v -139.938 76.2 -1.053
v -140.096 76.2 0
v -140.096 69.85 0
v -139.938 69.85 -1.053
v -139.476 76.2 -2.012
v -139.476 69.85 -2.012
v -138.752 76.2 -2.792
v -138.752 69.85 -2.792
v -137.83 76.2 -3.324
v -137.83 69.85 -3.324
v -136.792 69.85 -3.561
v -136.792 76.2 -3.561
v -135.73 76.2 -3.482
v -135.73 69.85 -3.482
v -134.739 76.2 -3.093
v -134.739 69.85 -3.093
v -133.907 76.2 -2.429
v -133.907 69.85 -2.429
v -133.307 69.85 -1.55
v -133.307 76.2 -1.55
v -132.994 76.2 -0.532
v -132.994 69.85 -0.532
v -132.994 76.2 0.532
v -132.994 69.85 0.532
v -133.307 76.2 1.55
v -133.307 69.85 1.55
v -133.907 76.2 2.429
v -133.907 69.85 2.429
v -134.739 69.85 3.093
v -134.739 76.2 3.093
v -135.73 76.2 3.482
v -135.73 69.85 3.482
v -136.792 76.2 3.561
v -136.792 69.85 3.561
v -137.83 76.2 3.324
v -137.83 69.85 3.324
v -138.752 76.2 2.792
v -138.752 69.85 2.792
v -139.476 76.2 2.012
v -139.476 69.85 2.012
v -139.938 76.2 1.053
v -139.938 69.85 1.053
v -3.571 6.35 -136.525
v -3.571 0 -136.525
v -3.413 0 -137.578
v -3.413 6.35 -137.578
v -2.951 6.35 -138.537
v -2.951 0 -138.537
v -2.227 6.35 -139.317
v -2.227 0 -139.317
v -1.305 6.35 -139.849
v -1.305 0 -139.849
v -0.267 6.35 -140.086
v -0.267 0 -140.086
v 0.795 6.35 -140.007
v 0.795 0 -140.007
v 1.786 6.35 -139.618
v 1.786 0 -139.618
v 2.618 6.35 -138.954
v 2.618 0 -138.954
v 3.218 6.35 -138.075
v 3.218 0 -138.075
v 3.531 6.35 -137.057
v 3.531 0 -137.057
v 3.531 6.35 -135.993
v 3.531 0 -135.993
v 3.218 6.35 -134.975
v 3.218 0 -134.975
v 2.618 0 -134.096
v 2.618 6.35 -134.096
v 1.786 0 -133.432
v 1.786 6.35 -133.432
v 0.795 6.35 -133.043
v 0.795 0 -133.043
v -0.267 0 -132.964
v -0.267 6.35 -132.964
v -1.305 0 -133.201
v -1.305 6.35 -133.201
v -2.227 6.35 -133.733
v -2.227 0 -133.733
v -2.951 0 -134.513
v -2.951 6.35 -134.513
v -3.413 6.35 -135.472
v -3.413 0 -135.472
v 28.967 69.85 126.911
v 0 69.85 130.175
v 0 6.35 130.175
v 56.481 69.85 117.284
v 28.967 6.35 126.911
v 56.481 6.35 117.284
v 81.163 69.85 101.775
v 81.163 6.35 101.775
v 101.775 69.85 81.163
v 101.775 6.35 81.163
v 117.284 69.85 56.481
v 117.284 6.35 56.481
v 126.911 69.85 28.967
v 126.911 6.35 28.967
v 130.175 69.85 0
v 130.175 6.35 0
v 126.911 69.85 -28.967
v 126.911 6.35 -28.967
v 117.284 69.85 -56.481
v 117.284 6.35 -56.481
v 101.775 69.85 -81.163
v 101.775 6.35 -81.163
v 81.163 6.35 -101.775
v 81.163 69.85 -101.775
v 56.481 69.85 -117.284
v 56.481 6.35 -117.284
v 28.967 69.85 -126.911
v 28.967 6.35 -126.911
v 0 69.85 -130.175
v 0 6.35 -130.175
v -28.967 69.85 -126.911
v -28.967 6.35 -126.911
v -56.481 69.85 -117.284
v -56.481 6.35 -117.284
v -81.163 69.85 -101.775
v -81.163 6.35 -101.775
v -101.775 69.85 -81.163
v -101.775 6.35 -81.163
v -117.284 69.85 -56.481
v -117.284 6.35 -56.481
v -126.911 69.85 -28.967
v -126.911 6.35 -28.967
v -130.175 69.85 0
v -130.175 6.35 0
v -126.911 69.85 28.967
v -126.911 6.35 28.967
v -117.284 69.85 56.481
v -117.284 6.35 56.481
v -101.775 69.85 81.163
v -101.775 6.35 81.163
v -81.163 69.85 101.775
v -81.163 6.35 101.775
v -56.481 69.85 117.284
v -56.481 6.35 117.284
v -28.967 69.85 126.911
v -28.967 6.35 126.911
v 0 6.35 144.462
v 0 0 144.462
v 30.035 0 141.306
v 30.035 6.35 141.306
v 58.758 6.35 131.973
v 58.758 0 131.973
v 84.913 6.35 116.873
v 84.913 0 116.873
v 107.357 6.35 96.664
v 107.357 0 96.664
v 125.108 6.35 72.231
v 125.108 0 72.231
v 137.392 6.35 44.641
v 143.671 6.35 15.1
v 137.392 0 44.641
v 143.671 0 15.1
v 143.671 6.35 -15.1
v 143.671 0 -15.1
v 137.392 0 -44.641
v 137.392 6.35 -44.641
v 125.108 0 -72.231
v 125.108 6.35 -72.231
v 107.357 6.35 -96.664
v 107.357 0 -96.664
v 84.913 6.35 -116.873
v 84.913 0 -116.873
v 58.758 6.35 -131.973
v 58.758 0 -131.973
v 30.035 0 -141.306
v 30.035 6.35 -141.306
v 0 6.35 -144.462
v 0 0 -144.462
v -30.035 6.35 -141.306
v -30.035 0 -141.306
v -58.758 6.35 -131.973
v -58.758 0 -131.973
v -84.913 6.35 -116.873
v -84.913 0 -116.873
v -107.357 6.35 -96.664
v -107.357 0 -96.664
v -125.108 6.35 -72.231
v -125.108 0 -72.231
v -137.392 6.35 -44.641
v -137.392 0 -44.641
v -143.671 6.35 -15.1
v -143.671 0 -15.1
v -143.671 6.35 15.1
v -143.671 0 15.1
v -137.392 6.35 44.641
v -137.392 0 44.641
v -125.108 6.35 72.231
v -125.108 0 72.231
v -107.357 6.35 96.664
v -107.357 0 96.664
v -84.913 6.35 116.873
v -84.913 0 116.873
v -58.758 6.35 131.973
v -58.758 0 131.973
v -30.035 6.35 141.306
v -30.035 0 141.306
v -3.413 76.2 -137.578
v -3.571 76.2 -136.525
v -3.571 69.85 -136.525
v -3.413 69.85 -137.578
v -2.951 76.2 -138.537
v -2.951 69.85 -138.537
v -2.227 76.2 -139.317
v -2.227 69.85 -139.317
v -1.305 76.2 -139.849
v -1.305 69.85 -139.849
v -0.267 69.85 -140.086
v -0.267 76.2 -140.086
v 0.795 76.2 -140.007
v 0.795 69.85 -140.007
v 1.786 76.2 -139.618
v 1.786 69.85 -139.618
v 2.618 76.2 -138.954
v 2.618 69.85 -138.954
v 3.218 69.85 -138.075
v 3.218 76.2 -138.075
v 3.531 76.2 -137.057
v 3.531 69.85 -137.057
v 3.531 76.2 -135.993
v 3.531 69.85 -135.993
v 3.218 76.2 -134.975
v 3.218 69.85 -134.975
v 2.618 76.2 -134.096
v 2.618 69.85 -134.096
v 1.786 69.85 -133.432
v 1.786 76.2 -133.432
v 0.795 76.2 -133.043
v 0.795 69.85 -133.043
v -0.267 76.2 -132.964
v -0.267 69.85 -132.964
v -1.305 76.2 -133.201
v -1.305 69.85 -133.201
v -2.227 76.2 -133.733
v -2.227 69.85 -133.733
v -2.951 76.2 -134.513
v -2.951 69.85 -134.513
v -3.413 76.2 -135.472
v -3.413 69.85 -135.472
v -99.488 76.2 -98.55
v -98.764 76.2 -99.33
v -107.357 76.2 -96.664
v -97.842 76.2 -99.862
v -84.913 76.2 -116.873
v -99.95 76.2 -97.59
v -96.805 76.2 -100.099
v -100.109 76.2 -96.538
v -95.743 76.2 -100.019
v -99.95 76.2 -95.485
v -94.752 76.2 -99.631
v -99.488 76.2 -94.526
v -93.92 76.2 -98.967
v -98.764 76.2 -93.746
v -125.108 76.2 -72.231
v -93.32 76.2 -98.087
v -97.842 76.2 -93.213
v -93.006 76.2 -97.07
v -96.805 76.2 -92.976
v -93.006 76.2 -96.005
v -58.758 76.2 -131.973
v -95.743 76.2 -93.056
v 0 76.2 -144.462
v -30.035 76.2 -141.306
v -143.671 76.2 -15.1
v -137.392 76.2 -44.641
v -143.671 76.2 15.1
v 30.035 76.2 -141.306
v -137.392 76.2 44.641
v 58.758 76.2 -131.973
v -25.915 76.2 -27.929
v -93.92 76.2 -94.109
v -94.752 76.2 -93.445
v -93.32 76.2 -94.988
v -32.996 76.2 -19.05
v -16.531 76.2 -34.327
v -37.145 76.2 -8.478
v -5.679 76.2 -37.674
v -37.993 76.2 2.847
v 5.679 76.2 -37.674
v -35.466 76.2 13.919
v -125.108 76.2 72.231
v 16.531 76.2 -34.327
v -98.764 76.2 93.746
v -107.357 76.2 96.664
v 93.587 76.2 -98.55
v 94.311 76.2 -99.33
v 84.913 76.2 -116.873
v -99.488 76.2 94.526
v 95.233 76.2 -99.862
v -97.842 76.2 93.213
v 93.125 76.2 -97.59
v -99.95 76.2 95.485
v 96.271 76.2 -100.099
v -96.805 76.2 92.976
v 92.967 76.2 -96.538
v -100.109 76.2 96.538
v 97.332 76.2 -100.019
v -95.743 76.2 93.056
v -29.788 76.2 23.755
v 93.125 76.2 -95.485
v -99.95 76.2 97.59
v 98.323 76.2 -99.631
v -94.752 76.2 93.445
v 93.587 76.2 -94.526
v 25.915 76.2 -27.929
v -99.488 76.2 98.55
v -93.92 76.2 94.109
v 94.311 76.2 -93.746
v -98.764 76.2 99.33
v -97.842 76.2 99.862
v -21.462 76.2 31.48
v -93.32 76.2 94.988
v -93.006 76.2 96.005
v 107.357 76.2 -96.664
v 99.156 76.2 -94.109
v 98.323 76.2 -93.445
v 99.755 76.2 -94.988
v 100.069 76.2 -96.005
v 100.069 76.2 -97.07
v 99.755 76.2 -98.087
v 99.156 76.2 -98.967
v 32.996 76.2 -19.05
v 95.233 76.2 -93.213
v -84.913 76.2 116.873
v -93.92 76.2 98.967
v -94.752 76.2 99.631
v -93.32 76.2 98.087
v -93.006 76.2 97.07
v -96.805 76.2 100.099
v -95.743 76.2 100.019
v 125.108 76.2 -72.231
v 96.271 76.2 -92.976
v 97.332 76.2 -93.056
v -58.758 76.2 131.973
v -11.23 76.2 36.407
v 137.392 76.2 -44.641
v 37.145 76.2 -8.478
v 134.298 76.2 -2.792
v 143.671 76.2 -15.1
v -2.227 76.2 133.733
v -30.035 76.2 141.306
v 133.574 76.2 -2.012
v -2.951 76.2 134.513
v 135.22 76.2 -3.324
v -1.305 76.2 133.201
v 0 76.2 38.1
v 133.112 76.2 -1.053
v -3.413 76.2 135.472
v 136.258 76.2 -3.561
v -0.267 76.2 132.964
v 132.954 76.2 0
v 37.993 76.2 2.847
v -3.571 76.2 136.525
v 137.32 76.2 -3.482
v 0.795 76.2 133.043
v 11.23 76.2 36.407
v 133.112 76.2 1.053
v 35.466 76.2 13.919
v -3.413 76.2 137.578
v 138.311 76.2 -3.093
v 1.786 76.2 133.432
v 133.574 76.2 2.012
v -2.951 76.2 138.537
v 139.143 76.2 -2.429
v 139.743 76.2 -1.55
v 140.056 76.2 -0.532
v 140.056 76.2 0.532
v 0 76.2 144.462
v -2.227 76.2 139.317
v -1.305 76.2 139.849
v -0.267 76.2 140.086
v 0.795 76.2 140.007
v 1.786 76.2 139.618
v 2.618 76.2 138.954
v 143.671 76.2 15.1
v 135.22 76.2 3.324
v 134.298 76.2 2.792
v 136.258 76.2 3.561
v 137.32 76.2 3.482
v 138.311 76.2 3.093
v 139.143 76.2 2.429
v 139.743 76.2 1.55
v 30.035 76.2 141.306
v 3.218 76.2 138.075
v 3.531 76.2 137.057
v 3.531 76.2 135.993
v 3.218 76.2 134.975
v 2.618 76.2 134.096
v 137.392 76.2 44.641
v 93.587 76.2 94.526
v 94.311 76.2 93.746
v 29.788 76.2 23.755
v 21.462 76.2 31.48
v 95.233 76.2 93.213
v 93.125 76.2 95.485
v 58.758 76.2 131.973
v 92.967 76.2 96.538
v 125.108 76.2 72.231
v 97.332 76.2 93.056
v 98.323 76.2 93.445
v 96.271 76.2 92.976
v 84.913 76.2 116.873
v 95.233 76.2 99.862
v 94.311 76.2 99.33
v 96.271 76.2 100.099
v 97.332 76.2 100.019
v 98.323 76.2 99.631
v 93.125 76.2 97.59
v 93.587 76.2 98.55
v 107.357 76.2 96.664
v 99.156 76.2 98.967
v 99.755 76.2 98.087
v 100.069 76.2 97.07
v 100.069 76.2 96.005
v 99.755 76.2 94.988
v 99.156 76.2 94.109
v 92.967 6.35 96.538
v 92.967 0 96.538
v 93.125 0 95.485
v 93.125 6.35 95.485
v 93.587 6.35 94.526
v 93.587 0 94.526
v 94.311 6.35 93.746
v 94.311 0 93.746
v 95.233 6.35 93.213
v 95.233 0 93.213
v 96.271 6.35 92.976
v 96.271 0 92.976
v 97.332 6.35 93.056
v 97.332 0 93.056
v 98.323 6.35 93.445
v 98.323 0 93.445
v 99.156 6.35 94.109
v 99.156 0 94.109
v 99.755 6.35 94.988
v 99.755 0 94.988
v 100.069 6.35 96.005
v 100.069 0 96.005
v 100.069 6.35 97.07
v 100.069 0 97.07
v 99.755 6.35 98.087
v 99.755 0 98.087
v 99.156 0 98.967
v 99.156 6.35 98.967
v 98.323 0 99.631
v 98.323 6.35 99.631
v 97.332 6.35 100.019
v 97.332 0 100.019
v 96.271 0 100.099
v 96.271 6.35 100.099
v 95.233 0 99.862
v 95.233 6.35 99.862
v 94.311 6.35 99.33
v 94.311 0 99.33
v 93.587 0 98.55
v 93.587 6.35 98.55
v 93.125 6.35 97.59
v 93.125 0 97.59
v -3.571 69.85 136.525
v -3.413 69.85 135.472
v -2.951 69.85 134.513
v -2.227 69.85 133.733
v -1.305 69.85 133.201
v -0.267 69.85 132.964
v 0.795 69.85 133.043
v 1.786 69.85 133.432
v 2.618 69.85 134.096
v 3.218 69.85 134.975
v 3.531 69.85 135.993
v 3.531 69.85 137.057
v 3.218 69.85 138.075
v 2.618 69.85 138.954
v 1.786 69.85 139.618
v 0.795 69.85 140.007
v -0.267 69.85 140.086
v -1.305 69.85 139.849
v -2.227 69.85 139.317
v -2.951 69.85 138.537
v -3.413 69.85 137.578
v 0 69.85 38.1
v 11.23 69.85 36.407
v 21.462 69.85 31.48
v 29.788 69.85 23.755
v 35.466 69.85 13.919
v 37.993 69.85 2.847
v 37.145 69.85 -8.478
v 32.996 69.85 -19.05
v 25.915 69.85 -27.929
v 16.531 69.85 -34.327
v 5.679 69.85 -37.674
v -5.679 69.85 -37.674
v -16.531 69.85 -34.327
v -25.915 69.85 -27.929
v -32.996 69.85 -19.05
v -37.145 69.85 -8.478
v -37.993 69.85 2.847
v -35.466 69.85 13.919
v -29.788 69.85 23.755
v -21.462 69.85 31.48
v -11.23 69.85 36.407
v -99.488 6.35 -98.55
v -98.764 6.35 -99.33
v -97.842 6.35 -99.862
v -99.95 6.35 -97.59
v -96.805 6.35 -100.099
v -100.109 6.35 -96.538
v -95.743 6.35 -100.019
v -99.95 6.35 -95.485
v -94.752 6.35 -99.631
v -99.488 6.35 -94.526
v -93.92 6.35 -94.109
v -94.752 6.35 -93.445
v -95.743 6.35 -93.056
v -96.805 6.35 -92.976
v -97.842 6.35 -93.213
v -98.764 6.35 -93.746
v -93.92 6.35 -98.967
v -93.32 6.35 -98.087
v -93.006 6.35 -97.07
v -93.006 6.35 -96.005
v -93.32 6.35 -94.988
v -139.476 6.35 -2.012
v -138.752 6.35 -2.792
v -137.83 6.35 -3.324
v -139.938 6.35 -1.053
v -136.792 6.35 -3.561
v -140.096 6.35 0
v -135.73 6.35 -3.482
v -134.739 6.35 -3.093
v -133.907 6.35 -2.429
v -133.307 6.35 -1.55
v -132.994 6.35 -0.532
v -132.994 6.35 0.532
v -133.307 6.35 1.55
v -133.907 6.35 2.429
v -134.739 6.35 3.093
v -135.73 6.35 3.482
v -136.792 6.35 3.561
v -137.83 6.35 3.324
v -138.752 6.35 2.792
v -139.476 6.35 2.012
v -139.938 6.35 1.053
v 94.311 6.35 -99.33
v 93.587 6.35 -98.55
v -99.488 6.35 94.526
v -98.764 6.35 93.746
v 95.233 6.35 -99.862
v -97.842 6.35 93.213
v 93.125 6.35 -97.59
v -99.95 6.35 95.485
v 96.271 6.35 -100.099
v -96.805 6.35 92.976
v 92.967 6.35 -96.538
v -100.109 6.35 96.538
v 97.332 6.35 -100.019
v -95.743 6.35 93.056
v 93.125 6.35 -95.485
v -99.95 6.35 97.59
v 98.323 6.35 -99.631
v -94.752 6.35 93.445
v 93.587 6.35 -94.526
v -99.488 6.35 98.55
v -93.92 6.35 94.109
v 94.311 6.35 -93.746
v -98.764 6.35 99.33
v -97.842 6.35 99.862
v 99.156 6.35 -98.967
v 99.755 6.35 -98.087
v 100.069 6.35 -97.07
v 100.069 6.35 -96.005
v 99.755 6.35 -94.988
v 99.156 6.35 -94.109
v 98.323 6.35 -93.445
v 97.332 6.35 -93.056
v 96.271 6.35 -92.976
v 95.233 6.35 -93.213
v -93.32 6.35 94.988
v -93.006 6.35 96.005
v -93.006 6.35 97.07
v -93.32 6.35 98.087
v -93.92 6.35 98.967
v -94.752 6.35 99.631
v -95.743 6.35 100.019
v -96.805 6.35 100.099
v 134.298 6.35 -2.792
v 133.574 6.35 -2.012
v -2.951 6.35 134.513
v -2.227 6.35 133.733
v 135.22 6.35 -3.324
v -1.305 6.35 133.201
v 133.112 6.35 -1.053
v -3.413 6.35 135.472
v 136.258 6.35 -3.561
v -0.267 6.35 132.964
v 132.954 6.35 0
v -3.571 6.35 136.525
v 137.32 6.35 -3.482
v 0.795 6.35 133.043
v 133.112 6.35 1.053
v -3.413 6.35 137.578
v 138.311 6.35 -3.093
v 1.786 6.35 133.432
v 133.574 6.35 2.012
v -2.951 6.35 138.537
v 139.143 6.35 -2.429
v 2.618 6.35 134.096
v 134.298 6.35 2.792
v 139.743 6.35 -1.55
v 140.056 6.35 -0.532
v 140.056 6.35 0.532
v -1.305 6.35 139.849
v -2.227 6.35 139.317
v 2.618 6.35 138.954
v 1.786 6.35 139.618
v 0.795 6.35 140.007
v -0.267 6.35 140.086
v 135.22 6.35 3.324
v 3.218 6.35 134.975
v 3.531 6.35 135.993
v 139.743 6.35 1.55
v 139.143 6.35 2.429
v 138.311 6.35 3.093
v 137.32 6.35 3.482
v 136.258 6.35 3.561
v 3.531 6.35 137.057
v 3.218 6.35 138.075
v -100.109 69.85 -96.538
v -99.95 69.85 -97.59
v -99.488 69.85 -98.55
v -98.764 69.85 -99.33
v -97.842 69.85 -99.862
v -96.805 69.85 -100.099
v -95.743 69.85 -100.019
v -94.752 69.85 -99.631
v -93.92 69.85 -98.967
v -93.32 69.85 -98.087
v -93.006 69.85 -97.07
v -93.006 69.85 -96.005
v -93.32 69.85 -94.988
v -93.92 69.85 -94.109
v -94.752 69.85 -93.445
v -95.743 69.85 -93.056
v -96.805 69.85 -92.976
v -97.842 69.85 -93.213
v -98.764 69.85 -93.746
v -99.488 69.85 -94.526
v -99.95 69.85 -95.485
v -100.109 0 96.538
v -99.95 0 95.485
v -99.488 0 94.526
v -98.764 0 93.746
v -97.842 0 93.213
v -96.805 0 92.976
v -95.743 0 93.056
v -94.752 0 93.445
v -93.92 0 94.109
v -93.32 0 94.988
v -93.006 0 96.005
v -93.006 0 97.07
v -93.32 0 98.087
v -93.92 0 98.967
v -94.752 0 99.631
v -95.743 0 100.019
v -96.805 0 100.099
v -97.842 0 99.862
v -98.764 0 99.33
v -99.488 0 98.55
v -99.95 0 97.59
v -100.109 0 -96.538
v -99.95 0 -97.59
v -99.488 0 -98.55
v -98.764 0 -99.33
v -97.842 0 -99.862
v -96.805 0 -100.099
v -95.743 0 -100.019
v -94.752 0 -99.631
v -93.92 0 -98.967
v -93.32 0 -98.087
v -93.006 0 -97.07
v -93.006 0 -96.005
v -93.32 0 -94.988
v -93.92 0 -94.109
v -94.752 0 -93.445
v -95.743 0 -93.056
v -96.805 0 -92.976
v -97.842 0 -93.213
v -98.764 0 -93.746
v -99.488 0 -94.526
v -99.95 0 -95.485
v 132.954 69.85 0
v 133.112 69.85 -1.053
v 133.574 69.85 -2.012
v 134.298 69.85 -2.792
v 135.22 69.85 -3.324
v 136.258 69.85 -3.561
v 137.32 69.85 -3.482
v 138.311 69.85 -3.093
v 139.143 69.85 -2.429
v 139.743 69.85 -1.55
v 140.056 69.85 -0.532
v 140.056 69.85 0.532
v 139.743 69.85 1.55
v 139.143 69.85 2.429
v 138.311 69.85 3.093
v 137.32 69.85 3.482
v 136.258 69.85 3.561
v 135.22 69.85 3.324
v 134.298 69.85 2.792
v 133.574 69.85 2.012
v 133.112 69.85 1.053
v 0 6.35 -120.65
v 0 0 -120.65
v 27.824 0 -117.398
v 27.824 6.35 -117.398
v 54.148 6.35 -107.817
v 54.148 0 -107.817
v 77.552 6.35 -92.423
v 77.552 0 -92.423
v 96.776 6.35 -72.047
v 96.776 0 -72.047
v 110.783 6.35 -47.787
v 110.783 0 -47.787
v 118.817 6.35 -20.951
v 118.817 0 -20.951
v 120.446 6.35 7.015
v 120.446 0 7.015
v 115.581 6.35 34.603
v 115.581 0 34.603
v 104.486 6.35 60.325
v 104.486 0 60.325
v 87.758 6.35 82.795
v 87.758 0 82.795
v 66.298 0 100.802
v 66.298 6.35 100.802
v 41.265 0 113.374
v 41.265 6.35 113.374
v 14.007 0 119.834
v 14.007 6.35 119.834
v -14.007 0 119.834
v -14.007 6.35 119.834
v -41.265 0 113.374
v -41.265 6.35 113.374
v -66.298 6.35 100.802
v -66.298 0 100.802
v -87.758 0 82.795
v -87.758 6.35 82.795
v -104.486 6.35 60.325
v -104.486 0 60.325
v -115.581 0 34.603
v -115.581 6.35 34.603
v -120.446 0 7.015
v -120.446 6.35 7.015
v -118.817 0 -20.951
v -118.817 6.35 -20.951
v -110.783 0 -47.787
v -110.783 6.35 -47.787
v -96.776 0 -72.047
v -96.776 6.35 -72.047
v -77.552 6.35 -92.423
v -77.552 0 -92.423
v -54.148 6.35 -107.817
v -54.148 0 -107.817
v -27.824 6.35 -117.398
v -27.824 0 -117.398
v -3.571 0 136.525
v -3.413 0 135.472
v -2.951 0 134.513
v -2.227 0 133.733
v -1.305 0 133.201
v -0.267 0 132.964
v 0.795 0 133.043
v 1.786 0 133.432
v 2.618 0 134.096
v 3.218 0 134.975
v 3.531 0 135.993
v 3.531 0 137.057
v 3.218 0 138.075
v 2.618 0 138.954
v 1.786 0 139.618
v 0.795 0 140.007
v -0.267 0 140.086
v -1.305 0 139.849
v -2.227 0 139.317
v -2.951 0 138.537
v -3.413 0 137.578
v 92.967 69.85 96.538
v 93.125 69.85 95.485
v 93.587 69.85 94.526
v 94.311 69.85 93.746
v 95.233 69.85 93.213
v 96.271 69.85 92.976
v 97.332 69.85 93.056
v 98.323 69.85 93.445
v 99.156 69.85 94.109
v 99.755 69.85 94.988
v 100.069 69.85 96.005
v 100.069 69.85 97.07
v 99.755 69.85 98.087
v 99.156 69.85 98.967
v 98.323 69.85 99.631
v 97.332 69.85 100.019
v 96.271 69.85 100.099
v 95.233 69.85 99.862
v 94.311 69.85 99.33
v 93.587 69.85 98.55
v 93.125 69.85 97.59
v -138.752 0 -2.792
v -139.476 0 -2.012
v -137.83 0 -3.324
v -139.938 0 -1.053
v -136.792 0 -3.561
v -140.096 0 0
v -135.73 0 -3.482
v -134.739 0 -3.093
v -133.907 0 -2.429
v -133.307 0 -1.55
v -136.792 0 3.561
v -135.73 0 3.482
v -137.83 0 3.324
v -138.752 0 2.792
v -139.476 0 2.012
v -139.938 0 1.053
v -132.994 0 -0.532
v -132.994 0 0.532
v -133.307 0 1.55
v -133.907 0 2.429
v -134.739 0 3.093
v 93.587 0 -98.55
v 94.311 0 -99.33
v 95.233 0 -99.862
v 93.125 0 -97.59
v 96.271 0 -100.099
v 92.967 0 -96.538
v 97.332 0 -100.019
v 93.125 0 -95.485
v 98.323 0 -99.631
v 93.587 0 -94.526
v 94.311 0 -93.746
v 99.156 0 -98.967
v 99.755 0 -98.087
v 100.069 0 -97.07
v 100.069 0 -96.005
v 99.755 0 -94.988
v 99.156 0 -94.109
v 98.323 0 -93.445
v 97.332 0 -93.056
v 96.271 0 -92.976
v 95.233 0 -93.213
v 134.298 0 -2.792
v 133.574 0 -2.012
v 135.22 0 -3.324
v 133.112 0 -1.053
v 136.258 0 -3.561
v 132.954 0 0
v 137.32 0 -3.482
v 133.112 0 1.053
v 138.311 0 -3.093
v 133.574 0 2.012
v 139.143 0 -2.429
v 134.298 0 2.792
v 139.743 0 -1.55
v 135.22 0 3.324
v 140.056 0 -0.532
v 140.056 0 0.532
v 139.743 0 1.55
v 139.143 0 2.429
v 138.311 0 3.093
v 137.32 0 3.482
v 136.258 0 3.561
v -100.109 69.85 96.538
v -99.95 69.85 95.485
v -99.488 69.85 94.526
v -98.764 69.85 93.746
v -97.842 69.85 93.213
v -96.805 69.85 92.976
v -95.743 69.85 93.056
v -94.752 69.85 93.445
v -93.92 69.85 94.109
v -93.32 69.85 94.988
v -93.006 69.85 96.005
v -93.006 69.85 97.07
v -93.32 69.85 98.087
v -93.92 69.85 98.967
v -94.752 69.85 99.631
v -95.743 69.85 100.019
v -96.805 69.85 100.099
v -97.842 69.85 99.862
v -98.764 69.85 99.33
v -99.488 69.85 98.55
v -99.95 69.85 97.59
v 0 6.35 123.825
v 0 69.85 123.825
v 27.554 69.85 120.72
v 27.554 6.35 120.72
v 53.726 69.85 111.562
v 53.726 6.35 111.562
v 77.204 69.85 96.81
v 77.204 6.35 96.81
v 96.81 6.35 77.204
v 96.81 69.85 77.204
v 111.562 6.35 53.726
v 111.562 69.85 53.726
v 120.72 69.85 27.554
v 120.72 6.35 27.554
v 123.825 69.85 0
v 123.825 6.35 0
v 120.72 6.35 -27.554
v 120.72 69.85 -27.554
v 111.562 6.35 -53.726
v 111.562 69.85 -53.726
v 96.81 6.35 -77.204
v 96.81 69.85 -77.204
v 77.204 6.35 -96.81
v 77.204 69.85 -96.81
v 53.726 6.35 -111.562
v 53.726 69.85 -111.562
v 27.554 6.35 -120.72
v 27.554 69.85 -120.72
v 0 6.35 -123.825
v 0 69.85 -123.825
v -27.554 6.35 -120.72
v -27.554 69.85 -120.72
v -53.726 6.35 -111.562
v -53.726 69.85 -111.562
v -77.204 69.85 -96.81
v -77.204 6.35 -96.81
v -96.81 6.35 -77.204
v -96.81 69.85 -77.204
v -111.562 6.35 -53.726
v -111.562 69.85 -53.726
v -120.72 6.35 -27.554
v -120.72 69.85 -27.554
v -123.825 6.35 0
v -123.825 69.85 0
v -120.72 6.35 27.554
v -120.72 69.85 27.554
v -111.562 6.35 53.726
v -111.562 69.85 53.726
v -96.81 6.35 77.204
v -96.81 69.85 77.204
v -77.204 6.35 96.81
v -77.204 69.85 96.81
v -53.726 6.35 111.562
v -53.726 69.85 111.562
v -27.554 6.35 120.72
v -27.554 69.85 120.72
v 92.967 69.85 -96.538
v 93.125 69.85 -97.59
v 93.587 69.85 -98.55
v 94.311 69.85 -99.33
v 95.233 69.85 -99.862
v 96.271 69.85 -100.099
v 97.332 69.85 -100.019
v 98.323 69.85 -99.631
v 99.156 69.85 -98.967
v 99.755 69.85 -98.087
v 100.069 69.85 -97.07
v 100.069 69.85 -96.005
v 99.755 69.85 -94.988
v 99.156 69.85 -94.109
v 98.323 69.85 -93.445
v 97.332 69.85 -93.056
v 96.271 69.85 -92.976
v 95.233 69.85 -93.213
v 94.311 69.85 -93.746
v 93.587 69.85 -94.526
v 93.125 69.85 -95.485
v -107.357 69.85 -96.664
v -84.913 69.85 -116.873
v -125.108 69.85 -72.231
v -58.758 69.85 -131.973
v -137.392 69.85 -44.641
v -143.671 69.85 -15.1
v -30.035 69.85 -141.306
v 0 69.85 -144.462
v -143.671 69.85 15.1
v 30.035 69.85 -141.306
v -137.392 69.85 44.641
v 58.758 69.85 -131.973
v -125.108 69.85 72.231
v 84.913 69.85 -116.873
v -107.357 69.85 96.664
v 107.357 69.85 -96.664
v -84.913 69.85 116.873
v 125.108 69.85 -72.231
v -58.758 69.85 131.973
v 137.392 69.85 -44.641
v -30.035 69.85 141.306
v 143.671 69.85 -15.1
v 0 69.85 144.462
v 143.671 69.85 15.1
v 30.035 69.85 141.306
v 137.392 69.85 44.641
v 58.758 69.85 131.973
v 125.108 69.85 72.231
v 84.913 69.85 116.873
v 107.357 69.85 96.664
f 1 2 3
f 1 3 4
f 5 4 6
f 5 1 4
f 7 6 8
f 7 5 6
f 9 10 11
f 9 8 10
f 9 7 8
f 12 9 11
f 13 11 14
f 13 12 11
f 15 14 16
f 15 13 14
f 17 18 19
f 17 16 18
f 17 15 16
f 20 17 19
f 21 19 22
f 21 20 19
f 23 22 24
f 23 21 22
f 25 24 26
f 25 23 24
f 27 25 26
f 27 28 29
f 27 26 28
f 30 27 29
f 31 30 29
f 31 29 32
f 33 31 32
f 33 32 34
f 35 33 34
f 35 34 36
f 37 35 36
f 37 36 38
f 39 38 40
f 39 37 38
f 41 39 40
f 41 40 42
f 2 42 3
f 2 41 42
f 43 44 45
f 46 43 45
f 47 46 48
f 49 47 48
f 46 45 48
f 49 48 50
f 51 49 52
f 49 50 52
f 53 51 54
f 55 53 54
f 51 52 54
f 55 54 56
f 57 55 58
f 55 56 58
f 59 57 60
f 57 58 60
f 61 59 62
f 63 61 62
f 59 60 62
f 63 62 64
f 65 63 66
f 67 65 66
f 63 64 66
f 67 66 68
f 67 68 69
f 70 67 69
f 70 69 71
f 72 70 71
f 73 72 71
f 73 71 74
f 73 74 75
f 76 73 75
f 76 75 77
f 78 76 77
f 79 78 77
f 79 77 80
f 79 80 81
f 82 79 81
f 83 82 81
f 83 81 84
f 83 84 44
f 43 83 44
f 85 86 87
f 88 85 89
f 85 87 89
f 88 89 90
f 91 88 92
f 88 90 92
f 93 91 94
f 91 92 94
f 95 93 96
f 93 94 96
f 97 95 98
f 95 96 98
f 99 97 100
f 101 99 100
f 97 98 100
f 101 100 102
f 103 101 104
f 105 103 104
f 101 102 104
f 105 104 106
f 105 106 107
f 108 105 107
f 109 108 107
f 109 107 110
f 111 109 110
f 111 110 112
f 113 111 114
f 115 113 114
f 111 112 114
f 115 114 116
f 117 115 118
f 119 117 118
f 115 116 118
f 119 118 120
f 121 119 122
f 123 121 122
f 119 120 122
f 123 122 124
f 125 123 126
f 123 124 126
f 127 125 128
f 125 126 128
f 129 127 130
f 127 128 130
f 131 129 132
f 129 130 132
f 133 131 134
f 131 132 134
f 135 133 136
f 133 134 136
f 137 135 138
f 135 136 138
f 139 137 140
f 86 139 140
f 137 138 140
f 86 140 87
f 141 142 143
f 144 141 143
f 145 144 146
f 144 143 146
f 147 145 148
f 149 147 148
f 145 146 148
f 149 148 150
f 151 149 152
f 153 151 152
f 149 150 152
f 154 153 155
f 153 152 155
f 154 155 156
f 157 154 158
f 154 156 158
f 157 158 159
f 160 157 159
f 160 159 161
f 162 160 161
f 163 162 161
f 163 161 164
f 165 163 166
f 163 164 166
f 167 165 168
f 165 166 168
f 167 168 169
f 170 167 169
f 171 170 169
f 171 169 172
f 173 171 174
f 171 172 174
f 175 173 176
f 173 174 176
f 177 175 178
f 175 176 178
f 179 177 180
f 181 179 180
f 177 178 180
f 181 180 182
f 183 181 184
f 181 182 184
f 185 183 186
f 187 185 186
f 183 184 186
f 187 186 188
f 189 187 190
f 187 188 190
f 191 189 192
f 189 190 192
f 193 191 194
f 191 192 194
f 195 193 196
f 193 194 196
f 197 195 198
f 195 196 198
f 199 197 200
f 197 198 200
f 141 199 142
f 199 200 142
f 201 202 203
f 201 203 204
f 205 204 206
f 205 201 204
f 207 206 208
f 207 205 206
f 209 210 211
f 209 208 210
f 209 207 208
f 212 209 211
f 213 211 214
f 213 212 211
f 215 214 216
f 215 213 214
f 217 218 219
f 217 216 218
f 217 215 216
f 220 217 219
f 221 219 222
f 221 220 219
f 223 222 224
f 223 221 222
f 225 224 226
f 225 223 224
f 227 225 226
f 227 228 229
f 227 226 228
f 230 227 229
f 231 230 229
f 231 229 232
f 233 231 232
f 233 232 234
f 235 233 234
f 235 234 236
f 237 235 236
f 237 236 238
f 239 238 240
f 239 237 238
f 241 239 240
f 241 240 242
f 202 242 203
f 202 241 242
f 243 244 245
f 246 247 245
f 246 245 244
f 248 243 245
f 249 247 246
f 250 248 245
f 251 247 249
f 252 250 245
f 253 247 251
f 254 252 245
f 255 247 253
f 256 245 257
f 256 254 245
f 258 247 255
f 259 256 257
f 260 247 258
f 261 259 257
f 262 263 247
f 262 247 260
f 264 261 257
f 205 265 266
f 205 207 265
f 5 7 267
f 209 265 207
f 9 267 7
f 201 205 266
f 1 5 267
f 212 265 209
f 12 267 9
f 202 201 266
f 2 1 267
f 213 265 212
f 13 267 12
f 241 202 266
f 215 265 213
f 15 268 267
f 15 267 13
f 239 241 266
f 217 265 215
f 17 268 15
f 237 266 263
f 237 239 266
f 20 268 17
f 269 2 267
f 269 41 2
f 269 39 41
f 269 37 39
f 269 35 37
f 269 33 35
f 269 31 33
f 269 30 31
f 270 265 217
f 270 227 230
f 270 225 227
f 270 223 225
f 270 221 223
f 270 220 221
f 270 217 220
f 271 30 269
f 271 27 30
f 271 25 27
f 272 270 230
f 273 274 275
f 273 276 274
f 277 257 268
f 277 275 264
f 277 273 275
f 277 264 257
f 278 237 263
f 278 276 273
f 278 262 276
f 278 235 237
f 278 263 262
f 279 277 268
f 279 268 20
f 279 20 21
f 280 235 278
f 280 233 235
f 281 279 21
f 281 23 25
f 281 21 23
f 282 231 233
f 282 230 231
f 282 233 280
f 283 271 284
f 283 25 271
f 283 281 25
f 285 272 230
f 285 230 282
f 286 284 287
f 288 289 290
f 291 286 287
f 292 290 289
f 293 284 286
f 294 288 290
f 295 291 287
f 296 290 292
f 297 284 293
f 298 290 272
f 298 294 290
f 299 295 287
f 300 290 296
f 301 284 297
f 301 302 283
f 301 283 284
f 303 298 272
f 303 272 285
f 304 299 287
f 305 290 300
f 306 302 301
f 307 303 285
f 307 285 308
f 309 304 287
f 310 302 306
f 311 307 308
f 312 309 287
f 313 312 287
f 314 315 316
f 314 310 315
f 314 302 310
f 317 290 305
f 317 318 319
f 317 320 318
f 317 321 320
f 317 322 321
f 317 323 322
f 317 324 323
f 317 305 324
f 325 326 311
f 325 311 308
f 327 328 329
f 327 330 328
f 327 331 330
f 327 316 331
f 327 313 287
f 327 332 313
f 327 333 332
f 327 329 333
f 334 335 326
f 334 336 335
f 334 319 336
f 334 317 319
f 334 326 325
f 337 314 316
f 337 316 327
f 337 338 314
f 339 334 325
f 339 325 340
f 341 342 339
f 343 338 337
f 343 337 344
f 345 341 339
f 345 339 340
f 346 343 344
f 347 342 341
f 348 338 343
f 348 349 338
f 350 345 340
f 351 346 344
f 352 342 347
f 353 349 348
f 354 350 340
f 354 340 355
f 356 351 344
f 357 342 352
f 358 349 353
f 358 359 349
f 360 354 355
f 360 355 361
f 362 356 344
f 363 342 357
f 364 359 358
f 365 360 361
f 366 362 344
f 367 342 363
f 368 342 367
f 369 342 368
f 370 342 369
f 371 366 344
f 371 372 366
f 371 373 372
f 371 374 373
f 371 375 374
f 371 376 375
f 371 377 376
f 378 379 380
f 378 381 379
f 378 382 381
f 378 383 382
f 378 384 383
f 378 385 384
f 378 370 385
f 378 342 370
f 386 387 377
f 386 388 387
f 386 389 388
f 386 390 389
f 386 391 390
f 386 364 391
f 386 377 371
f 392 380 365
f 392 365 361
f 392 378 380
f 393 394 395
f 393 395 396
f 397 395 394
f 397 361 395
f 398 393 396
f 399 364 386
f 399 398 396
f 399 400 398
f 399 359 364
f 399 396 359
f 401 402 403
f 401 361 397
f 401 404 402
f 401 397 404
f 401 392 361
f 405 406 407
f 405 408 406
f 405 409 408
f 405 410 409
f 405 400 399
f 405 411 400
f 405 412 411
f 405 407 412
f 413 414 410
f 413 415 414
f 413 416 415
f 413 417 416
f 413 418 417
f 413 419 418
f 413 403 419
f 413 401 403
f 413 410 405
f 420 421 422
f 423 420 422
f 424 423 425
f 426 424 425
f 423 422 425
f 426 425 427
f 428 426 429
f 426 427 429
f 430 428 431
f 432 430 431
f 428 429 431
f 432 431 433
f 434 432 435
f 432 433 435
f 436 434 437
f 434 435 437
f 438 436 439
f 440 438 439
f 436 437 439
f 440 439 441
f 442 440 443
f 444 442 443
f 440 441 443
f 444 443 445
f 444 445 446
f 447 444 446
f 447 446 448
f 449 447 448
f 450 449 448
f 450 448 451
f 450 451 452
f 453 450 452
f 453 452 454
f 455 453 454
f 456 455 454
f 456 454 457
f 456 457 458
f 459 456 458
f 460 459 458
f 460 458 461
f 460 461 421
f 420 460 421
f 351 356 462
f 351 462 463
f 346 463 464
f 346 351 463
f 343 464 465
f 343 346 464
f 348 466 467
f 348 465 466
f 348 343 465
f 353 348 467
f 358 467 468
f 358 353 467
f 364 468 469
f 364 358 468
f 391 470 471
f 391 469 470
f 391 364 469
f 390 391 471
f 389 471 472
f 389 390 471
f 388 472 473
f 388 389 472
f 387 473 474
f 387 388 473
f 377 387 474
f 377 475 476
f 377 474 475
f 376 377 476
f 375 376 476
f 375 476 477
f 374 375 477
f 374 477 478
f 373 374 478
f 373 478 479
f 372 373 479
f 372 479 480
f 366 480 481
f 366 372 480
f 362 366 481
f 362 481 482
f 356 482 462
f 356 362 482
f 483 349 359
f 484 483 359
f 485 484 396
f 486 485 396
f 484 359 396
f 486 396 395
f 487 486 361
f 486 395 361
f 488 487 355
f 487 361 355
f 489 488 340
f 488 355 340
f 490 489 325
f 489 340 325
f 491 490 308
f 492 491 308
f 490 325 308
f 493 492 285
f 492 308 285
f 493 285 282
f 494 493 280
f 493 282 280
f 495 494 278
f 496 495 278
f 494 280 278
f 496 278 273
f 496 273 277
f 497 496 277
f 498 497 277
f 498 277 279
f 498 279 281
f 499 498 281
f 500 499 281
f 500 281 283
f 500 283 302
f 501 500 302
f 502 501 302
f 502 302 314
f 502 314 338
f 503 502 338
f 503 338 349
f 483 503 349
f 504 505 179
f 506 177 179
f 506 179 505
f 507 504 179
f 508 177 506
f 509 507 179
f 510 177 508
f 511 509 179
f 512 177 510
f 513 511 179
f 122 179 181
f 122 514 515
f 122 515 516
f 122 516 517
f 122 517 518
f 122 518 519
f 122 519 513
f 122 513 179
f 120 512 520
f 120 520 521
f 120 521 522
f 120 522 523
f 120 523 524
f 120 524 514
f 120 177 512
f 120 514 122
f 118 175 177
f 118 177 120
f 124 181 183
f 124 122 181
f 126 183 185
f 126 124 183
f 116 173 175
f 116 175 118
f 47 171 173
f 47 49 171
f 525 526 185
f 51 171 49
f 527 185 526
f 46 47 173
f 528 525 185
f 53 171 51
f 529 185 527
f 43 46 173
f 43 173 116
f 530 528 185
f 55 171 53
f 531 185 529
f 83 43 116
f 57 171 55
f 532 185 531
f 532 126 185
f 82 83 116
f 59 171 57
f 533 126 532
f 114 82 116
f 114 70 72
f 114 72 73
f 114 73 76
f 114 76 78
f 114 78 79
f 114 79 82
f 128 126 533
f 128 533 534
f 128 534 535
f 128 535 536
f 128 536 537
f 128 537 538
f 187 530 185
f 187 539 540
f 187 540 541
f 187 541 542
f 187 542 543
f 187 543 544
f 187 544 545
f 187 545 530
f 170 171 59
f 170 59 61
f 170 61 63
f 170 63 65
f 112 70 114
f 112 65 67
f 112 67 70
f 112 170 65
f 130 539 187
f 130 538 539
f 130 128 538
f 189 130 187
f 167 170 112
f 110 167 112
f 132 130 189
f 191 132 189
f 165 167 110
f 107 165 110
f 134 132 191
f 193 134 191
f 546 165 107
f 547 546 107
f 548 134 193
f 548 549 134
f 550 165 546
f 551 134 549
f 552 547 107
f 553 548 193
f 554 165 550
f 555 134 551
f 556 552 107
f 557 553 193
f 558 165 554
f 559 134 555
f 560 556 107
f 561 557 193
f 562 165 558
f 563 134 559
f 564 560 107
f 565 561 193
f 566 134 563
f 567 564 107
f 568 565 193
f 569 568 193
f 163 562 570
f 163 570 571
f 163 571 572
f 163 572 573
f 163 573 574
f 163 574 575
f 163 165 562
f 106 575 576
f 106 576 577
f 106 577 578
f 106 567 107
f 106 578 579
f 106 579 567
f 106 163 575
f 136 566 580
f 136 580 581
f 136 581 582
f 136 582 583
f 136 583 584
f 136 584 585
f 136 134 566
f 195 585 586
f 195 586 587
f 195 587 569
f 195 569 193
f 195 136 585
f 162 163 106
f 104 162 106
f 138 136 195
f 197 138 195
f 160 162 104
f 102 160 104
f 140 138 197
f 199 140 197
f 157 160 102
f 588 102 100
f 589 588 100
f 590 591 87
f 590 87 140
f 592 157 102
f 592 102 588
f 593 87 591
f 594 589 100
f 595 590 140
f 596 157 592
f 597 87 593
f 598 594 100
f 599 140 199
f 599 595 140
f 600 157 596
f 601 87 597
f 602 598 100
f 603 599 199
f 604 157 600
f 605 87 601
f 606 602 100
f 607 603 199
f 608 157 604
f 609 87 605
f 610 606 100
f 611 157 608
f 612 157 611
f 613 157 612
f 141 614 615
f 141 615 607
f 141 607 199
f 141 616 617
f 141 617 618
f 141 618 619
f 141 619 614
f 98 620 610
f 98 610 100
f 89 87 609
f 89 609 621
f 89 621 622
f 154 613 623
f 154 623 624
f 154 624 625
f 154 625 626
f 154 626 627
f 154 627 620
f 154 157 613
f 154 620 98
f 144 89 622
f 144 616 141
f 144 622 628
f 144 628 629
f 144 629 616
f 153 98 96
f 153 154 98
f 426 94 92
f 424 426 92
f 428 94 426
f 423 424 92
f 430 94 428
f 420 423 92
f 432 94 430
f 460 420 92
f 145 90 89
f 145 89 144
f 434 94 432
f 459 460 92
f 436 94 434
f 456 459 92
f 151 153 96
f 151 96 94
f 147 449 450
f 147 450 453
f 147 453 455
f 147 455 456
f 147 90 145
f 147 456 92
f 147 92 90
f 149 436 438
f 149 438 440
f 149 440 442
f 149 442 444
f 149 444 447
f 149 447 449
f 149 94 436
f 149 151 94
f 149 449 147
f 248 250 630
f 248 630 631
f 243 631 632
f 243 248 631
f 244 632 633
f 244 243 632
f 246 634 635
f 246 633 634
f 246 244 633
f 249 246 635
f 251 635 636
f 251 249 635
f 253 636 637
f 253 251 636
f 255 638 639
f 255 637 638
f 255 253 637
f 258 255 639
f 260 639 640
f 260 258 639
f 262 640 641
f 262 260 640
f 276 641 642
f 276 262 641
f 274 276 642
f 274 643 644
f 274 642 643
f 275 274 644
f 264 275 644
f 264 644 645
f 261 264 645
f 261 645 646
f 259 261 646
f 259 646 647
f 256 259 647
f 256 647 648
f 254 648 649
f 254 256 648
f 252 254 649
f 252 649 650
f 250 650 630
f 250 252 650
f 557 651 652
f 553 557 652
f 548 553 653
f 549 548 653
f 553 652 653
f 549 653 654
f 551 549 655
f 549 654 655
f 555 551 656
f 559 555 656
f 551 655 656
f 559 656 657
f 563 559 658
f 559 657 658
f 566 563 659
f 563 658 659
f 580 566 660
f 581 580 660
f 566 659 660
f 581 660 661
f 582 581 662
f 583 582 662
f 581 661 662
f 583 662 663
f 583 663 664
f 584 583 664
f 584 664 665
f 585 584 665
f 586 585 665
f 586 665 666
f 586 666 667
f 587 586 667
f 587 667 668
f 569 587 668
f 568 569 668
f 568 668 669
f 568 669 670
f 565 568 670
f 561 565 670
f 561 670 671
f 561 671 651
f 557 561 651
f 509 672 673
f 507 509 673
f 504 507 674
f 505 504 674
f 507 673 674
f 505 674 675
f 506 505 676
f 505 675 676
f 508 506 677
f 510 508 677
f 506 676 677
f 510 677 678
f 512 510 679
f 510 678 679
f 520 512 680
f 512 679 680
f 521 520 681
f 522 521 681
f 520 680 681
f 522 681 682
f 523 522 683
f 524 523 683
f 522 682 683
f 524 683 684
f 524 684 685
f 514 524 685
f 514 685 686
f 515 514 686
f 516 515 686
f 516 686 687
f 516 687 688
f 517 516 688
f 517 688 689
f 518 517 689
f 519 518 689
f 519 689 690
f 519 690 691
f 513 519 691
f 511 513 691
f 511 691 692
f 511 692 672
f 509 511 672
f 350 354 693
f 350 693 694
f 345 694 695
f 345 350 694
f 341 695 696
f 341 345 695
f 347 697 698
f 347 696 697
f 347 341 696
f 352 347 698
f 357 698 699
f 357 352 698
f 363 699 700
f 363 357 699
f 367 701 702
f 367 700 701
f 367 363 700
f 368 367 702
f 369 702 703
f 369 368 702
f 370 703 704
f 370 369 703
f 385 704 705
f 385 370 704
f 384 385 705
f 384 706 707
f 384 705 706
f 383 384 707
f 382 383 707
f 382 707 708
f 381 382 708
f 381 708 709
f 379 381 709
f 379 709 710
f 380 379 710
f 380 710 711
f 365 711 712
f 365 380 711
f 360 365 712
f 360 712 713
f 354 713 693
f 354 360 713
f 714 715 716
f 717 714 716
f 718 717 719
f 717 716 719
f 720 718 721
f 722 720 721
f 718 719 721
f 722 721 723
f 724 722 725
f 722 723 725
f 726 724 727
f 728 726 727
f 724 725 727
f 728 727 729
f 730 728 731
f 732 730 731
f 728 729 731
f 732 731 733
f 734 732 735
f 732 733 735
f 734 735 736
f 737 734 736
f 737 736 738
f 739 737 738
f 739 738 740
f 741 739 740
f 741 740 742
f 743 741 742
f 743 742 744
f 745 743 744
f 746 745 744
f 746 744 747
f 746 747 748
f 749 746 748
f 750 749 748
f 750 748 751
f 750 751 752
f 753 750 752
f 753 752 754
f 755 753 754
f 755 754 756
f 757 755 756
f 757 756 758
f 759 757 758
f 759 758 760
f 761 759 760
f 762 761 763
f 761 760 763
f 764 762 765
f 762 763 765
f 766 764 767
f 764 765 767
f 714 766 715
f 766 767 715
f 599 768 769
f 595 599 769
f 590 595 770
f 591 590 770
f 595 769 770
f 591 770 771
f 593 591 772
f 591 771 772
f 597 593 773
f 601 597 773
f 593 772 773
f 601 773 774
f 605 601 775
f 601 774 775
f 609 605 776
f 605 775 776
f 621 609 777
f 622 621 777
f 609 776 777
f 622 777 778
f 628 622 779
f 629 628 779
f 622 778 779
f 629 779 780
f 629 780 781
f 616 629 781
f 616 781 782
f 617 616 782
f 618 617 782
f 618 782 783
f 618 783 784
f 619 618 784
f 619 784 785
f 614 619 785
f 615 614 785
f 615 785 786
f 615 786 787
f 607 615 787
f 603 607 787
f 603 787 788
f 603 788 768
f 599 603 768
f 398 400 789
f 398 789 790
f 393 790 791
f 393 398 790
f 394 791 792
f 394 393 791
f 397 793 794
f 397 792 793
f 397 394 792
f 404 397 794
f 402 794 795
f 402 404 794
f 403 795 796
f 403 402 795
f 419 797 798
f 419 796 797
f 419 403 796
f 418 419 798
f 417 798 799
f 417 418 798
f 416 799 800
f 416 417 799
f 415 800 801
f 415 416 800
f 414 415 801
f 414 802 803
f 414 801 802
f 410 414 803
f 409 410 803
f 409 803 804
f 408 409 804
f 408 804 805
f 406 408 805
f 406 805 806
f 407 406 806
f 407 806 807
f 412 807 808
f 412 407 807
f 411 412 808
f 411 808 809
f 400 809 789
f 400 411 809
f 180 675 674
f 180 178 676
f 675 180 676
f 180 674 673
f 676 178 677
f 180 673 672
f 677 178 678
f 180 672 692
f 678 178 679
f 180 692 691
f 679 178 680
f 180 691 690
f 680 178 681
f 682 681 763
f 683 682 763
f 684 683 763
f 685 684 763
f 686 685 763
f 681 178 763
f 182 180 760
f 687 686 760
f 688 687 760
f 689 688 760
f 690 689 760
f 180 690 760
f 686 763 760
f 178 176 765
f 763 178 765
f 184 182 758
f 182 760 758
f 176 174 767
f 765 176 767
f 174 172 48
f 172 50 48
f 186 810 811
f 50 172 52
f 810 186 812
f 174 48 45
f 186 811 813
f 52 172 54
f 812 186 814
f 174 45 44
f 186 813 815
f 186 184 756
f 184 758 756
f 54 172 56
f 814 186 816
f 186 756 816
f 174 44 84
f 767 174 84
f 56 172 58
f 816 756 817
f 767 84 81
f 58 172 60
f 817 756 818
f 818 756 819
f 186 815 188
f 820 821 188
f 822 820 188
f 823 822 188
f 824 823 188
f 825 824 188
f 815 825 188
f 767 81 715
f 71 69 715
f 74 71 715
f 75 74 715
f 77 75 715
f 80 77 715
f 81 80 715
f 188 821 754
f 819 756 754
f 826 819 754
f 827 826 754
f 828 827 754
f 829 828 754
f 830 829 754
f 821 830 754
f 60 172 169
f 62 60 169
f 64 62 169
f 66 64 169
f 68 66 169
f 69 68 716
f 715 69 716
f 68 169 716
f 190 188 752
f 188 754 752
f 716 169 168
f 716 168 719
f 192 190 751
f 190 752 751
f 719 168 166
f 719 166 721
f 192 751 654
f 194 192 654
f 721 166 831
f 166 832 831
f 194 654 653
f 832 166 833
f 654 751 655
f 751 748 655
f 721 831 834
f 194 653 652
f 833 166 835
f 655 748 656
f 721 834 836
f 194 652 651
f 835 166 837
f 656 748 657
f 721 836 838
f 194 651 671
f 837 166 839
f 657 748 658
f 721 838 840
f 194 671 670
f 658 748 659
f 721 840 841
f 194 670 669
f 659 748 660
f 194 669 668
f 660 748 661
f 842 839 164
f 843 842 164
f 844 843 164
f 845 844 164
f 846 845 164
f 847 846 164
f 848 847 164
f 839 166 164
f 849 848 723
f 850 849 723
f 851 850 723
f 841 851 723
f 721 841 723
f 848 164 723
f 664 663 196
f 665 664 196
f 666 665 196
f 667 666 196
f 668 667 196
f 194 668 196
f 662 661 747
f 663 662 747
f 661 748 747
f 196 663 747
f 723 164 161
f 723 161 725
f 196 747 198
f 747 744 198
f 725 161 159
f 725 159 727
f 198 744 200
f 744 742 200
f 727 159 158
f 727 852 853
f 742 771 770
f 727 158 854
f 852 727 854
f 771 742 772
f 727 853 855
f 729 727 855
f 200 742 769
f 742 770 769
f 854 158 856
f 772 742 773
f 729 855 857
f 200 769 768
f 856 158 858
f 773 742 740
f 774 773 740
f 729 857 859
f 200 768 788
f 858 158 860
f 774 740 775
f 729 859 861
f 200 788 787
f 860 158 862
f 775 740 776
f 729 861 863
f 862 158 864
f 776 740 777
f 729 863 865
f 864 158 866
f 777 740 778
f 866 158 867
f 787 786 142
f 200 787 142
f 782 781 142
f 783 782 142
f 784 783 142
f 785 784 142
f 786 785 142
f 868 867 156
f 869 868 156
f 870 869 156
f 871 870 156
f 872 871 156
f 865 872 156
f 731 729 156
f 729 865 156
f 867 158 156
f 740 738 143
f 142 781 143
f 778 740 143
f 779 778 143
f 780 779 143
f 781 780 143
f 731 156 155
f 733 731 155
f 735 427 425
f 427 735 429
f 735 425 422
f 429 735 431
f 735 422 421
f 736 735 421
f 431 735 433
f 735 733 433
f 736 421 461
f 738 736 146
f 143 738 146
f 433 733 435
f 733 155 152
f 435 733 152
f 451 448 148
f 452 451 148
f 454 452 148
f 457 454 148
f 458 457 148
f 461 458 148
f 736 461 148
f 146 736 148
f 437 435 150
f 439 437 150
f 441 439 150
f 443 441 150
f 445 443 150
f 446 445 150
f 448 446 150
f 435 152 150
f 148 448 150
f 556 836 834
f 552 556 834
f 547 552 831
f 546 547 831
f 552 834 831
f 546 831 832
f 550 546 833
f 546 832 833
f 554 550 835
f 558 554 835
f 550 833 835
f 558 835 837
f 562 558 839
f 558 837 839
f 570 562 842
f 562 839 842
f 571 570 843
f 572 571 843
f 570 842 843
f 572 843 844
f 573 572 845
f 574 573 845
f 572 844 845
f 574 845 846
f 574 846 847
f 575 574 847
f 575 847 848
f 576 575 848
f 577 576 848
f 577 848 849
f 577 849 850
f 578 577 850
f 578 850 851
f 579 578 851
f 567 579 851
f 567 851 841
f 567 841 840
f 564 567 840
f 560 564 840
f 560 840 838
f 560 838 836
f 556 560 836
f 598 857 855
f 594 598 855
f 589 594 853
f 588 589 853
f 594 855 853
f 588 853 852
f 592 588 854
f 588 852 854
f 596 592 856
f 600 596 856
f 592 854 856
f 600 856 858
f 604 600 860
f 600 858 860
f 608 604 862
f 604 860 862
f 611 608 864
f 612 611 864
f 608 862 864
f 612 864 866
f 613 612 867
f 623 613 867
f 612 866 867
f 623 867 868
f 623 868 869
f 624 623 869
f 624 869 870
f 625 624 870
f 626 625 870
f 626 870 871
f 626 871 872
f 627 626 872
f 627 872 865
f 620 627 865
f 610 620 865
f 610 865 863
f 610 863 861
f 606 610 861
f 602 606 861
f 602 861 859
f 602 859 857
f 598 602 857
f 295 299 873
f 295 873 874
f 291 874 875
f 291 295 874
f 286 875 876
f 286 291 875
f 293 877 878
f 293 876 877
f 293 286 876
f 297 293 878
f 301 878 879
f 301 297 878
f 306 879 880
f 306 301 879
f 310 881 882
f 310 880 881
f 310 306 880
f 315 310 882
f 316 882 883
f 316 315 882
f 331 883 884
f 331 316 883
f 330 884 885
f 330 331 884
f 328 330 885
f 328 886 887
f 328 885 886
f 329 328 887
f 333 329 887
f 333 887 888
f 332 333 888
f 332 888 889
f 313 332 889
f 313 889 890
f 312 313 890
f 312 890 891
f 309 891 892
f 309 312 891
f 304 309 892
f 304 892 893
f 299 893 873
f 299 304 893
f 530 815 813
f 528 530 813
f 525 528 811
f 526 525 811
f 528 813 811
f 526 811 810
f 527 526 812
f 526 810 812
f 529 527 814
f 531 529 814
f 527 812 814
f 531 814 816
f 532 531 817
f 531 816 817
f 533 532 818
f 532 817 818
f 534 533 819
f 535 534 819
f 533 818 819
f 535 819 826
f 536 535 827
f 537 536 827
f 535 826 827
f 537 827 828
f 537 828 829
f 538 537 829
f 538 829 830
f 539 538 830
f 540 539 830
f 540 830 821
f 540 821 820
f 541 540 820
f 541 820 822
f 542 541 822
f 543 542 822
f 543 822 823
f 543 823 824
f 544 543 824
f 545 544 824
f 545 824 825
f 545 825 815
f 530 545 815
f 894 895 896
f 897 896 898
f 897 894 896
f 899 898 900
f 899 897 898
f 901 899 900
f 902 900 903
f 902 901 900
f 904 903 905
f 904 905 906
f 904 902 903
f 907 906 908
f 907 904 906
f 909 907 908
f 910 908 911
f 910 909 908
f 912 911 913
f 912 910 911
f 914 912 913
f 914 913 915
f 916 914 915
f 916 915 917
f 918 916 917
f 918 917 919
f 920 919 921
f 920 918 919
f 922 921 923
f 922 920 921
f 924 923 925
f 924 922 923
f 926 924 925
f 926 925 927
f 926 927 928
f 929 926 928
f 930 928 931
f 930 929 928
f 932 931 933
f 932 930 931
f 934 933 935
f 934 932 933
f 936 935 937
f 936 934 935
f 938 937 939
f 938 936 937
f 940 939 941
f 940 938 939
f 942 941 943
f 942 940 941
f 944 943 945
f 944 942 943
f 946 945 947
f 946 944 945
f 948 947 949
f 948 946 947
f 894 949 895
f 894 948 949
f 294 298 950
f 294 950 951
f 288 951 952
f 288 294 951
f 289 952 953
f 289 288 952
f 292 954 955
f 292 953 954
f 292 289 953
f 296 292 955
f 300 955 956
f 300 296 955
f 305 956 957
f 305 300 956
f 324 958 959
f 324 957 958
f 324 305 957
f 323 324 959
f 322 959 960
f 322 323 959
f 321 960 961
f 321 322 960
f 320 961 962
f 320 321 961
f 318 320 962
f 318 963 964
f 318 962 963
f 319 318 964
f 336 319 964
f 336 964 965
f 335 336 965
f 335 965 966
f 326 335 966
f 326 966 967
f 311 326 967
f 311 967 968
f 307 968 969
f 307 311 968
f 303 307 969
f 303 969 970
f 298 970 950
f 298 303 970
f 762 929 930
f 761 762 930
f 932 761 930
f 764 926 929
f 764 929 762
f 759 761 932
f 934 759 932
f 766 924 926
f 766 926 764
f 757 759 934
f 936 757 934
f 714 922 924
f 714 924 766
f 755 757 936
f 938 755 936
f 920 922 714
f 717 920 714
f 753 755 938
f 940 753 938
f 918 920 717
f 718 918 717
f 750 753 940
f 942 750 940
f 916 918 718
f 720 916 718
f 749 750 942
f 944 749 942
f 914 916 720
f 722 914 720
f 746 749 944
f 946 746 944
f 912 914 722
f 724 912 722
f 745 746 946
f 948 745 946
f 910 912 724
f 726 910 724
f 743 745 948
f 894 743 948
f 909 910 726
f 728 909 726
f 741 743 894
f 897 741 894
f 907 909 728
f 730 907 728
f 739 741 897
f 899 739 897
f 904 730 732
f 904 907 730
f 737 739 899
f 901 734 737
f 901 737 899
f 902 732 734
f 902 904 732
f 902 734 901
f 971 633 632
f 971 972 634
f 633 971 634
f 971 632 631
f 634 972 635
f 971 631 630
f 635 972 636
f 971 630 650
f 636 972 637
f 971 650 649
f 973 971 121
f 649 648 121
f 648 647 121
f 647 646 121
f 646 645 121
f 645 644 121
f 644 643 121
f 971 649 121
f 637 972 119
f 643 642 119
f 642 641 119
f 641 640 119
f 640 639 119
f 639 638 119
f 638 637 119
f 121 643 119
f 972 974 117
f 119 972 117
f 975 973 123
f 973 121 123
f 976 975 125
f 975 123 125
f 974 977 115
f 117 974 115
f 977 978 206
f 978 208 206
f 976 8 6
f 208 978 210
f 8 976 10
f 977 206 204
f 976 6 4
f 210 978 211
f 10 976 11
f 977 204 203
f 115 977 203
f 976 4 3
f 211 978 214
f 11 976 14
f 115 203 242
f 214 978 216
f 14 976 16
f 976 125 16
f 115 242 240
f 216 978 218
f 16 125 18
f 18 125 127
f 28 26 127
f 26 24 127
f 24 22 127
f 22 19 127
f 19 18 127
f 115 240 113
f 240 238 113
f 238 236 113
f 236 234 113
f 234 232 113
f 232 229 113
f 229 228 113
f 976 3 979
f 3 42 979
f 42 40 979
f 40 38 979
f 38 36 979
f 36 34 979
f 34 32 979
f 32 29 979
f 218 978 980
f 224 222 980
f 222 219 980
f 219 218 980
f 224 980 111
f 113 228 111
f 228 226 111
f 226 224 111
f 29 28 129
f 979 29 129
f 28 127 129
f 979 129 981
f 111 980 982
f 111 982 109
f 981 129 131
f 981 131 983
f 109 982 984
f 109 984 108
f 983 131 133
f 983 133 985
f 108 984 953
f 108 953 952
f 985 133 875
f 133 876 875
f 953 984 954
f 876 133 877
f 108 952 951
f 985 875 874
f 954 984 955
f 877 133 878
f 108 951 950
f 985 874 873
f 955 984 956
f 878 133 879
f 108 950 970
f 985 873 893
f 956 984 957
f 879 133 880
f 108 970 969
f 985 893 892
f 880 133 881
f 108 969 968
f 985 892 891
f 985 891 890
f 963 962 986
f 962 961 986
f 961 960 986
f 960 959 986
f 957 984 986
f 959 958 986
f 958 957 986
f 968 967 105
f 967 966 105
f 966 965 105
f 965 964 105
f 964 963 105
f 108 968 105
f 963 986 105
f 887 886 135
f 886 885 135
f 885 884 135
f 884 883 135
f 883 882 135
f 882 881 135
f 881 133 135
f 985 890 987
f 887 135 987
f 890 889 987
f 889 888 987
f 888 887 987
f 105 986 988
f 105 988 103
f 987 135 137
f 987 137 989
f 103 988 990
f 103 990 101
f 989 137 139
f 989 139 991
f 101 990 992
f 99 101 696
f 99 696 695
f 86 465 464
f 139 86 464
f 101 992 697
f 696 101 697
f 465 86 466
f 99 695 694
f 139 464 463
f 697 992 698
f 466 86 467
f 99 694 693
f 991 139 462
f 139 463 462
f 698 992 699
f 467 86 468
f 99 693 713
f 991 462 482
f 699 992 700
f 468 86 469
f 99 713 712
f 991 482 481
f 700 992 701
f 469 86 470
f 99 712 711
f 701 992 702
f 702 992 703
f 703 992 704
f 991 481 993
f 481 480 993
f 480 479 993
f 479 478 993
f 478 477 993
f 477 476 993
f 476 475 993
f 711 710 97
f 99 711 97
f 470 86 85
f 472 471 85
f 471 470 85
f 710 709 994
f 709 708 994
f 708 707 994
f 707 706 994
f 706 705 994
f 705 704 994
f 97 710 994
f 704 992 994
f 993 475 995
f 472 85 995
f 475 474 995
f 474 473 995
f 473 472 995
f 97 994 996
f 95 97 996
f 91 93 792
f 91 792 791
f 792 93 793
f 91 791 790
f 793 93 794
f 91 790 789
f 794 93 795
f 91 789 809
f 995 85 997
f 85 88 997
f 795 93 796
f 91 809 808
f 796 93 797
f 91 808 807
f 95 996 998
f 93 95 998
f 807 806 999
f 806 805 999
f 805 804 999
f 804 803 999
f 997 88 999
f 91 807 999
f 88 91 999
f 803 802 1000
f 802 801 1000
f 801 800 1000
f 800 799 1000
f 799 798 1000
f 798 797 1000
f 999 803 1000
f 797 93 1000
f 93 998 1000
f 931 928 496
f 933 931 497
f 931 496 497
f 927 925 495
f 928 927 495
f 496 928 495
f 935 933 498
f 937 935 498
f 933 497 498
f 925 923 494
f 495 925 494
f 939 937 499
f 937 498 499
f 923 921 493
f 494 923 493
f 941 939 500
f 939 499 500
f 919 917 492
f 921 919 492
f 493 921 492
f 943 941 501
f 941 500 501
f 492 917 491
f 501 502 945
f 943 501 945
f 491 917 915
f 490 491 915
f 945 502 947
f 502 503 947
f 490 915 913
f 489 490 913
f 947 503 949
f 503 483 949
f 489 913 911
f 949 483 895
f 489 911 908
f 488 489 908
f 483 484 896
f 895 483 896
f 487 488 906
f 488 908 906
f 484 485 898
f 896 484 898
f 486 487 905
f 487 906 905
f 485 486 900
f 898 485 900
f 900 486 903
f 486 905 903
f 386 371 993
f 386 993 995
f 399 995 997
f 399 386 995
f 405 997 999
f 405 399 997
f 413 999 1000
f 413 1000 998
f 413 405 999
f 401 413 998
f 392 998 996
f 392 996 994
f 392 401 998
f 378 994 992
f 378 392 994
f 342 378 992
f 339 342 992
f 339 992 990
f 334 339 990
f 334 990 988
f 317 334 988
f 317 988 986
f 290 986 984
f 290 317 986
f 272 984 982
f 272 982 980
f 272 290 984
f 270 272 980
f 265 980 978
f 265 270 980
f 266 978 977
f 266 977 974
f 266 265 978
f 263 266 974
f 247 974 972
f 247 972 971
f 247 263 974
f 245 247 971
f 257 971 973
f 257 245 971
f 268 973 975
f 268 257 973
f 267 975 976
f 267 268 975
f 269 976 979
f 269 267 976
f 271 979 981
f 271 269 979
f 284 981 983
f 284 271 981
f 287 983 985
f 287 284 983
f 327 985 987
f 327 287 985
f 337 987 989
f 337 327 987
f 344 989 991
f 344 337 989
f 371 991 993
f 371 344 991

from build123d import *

# Parameters (mm, degrees)
SKETCH1_R               = 144.4625
BOSS_EXTRUDE1_DEPTH     = 6.35
F_1_4_CLEARANCE_HOLE1_D = 7.14248
SKETCH4_R               = 130.175
SKETCH4_R_2             = 123.825
BOSS_EXTRUDE2_DEPTH     = 63.5
SKETCH7_R               = 120.65
CUT_EXTRUDE1_DEPTH      = 69.85
CUT_EXTRUDE2_REACH      = 220.049
SKETCH8_R               = 38.1


with BuildPart() as part:
    # Sketch1 → Boss-Extrude1 (new body)
    with BuildSketch(Plane(origin=(0, 0, 0), x_dir=(1, 0, 0), z_dir=(0, 1, 0))):
        with Locations(Location((0, 0, 0), (0, 0, 270))):
            Circle(SKETCH1_R)
    boss_extrude1 = extrude(amount=BOSS_EXTRUDE1_DEPTH)

    # 1/4 Clearance Hole1 (through all)
    with Locations(Plane(origin=(0, 6.35, 0), x_dir=(1, 0, 0), z_dir=(0, 1, 0))):
        with Locations((-96.537753301, 96.537753301), (0, 136.525), (96.537753301, 96.537753301), (136.525, 0), (96.537753301, -96.537753301), (0, -136.525), (-96.537753301, -96.537753301), (-136.525, 0)):
            f_1_4_clearance_hole1 = Hole(F_1_4_CLEARANCE_HOLE1_D / 2)

    # Sketch4 → Boss-Extrude2 (add)
    with BuildSketch(Plane(origin=(0, 6.35, 0), x_dir=(1, 0, 0), z_dir=(0, 1, 0))):
        with Locations(Location((0, 0, 0), (0, 0, 270))):
            Circle(SKETCH4_R)
        with Locations(Location((0, 0, 0), (0, 0, 270))):
            Circle(SKETCH4_R_2, mode=Mode.SUBTRACT)
    extrude(amount=BOSS_EXTRUDE2_DEPTH)

    # Mirror2: Boss-Extrude1 across plane
    add(boss_extrude1.mirror(Plane.ZX.offset(38.1)))

    # Mirror3: 1/4 Clearance Hole1 across plane
    add(f_1_4_clearance_hole1.mirror(Plane.ZX.offset(38.1)), mode=Mode.SUBTRACT)

    # Sketch7 → Cut-Extrude1 (cut)
    with BuildSketch(Plane.XZ):
        with Locations(Location((0, 0, 0), (0, 0, 270))):
            Circle(SKETCH7_R)
    extrude(amount=-CUT_EXTRUDE1_DEPTH, mode=Mode.SUBTRACT)

    # Sketch8 → Cut-Extrude2 (cut, up to next)
    with BuildSketch(Plane(origin=(0, 76.2, 0), x_dir=(1, 0, 0), z_dir=(0, 1, 0)), mode=Mode.PRIVATE) as cut_extrude2_sk1:
        with Locations(Location((0, 0, 0), (0, 0, 270))):
            Circle(SKETCH8_R)
    cut_extrude2_tool1 = extrude(cut_extrude2_sk1.sketch, amount=-CUT_EXTRUDE2_REACH, mode=Mode.PRIVATE) & part.part
    add(cut_extrude2_tool1.solids().sort_by_distance((0, 76.2, 0))[0], mode=Mode.SUBTRACT)


solid = part.part
